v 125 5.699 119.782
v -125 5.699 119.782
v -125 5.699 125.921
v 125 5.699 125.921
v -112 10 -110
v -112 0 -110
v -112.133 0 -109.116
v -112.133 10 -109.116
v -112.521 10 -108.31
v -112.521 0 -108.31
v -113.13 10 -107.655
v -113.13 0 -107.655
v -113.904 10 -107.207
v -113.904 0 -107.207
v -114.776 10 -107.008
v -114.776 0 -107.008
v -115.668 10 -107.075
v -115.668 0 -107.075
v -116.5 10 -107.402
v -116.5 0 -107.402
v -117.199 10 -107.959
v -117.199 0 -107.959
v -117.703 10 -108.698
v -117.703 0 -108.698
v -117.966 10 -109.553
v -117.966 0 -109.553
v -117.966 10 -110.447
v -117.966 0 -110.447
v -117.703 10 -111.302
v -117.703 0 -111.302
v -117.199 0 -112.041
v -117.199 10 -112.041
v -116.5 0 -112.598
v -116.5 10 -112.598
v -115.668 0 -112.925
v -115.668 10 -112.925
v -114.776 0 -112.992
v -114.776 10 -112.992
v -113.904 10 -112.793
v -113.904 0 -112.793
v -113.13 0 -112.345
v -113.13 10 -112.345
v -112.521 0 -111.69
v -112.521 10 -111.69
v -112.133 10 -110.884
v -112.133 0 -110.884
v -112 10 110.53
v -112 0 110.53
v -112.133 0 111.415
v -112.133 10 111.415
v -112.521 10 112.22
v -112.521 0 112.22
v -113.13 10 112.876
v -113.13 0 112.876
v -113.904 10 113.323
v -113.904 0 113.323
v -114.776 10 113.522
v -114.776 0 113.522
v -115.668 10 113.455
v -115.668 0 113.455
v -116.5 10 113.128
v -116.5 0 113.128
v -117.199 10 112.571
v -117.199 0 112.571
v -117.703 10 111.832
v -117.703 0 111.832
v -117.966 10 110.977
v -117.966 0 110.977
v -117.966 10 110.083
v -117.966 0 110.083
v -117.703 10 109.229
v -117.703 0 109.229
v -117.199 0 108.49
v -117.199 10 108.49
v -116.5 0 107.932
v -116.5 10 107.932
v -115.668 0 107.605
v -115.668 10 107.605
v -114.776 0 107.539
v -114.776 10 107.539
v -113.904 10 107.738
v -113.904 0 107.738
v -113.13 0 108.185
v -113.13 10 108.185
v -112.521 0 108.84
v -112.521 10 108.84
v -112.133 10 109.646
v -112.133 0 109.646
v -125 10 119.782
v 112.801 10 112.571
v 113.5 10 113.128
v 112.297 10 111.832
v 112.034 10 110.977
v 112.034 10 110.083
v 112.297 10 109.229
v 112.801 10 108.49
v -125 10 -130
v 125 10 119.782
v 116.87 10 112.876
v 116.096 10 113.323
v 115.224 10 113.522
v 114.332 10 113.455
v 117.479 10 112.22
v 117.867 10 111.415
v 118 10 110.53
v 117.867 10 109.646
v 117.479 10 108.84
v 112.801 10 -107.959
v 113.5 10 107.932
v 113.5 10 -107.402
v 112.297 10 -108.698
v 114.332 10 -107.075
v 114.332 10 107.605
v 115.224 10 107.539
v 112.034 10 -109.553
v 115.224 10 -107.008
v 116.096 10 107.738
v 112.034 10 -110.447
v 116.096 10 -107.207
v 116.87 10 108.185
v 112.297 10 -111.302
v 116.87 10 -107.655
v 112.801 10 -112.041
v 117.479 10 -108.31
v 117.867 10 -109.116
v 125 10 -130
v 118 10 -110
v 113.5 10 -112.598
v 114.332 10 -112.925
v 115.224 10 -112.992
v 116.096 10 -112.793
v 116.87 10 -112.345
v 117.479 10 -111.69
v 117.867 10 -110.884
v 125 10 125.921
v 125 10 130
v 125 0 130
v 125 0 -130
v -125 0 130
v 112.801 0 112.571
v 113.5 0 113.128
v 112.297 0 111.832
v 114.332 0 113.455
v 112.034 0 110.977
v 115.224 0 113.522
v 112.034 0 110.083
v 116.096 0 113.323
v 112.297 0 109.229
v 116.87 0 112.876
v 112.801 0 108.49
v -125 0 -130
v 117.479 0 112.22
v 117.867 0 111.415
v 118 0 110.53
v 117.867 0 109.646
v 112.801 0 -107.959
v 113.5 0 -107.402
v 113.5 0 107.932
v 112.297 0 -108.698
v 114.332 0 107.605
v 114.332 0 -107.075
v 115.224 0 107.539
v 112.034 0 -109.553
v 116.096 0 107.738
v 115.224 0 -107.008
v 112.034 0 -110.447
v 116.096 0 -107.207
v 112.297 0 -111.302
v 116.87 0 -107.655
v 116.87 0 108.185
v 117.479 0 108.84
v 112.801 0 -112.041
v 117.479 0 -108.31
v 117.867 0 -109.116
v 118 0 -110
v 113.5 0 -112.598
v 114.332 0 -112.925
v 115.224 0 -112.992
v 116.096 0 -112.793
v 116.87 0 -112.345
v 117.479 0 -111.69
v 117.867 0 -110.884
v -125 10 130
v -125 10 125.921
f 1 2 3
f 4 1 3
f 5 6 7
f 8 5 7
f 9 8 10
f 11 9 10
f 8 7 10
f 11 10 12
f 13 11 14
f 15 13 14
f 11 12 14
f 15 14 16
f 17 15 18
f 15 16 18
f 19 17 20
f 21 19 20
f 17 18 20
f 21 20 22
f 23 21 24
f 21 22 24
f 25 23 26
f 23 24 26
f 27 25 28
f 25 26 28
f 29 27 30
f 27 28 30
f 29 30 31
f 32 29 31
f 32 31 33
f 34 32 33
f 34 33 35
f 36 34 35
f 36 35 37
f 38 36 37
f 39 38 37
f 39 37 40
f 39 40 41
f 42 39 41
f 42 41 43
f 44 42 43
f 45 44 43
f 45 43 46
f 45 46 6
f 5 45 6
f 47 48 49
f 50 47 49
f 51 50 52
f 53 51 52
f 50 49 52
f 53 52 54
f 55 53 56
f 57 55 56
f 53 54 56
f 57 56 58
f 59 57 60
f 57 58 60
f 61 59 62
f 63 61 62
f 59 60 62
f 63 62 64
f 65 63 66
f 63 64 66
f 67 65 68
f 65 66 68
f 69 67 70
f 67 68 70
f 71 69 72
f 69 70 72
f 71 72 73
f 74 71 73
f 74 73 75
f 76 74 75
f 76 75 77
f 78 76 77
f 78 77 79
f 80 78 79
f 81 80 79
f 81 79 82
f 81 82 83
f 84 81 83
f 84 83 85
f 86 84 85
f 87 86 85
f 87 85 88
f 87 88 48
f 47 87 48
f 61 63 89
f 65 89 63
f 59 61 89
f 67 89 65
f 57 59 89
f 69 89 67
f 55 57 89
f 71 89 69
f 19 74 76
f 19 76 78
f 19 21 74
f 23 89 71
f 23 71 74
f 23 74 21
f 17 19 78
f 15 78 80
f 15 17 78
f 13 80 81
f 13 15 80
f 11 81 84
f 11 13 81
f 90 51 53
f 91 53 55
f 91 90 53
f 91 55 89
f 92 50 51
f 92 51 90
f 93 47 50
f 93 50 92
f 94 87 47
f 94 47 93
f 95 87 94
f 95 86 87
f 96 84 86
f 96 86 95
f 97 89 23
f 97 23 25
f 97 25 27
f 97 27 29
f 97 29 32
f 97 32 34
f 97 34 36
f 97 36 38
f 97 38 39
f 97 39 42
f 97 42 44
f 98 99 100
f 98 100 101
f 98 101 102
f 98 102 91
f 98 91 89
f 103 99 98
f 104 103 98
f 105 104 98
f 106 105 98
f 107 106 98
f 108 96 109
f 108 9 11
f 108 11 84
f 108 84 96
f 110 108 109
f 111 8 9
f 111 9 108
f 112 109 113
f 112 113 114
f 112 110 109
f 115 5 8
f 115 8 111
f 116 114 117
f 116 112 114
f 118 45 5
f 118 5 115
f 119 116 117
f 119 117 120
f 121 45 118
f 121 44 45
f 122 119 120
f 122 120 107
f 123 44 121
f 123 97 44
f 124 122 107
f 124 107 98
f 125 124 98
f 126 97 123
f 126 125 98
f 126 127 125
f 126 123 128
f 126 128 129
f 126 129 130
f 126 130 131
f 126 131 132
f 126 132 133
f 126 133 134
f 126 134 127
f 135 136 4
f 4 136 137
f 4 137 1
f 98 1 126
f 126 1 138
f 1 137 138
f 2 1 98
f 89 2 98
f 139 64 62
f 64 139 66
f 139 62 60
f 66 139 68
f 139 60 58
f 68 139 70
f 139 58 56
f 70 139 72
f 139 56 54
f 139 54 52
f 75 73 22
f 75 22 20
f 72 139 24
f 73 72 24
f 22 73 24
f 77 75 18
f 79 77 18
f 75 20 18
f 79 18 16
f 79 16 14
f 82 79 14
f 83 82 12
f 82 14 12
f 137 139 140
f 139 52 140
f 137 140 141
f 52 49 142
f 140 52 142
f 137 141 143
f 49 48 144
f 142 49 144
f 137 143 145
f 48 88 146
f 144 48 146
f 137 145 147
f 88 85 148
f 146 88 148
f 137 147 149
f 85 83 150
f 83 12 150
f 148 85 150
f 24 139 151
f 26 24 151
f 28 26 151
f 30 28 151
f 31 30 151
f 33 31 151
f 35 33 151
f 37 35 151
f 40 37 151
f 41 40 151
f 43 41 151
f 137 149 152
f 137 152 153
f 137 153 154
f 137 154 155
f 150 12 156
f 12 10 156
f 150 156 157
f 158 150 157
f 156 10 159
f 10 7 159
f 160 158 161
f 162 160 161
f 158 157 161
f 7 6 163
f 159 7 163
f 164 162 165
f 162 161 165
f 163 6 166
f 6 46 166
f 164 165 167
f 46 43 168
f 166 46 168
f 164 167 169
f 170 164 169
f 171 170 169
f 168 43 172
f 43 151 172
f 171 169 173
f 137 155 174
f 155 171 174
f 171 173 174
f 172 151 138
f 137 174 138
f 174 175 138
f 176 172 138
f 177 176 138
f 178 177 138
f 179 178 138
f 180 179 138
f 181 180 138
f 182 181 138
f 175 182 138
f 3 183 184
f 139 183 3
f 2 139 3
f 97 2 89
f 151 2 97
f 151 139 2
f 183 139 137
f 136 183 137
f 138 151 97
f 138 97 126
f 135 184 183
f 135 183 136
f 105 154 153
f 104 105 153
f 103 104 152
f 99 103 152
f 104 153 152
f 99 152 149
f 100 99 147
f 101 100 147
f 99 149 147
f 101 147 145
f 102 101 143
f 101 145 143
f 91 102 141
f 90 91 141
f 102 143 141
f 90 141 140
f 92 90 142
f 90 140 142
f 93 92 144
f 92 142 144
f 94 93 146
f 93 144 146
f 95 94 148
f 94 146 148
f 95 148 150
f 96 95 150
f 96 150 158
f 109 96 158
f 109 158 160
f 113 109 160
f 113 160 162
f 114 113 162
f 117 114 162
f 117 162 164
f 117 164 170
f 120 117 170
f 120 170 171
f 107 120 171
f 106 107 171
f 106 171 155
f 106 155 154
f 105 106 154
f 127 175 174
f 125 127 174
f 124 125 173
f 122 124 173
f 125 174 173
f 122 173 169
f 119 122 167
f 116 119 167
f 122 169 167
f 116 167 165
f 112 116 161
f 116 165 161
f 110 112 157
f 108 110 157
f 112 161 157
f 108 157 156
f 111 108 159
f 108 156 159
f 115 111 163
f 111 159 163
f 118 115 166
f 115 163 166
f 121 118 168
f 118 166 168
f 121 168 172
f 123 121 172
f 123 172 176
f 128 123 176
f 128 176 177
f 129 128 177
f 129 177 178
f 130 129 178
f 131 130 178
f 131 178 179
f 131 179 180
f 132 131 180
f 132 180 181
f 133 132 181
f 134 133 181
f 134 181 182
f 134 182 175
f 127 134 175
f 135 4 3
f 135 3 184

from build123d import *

# Parameters (mm, degrees)
CROQUIS1_W              = 250
CROQUIS1_H              = 260
SALIENTE_EXTRUIR1_DEPTH = 10
CORTAR_EXTRUIR1_REACH   = 252
CROQUIS4_W              = 6.138345694
CROQUIS4_H              = 4.301035896
CORTAR_EXTRUIR2_REACH   = 12
CROQUIS5_R              = 3


with BuildPart() as part:
    # Croquis1 → Saliente-Extruir1 (new body)
    with BuildSketch(Plane(origin=(0, 0, 0), x_dir=(1, 0, 0), z_dir=(0, 1, 0))):
        Rectangle(CROQUIS1_W, CROQUIS1_H)
    extrude(amount=SALIENTE_EXTRUIR1_DEPTH)

    # Croquis4 → Cortar-Extruir1 (cut, up to next)
    with BuildSketch(Plane.ZY.offset(125), mode=Mode.PRIVATE) as cortar_extruir1_sk1:
        with Locations((122.851537289, 7.849482052)):
            Rectangle(CROQUIS4_W, CROQUIS4_H)
    cortar_extruir1_tool1 = extrude(cortar_extruir1_sk1.sketch, amount=-CORTAR_EXTRUIR1_REACH, mode=Mode.PRIVATE) & part.part
    add(cortar_extruir1_tool1.solids().sort_by_distance((-125, 7.849482, 122.851537))[0], mode=Mode.SUBTRACT)

    # Croquis5 → Cortar-Extruir2 (cut, up to next)
    with BuildSketch(Plane.XZ, mode=Mode.PRIVATE) as cortar_extruir2_sk1:
        with Locations((-115, 110.530243228)):
            Circle(CROQUIS5_R)
    cortar_extruir2_tool1 = extrude(cortar_extruir2_sk1.sketch, amount=-CORTAR_EXTRUIR2_REACH, mode=Mode.PRIVATE) & part.part
    add(cortar_extruir2_tool1.solids().sort_by_distance((-115, 0, 110.530243))[0], mode=Mode.SUBTRACT)
    # Croquis5 → Cortar-Extruir2 (cut, up to next)
    with BuildSketch(Plane.XZ, mode=Mode.PRIVATE) as cortar_extruir2_sk2:
        with Locations((115, 110.530243228)):
            Circle(CROQUIS5_R)
    cortar_extruir2_tool2 = extrude(cortar_extruir2_sk2.sketch, amount=-CORTAR_EXTRUIR2_REACH, mode=Mode.PRIVATE) & part.part
    add(cortar_extruir2_tool2.solids().sort_by_distance((115, 0, 110.530243))[0], mode=Mode.SUBTRACT)
    # Croquis5 → Cortar-Extruir2 (cut, up to next)
    with BuildSketch(Plane.XZ, mode=Mode.PRIVATE) as cortar_extruir2_sk3:
        with Locations((-115, -110)):
            Circle(CROQUIS5_R)
    cortar_extruir2_tool3 = extrude(cortar_extruir2_sk3.sketch, amount=-CORTAR_EXTRUIR2_REACH, mode=Mode.PRIVATE) & part.part
    add(cortar_extruir2_tool3.solids().sort_by_distance((-115, 0, -110))[0], mode=Mode.SUBTRACT)
    # Croquis5 → Cortar-Extruir2 (cut, up to next)
    with BuildSketch(Plane.XZ, mode=Mode.PRIVATE) as cortar_extruir2_sk4:
        with Locations((115, -110)):
            Circle(CROQUIS5_R)
    cortar_extruir2_tool4 = extrude(cortar_extruir2_sk4.sketch, amount=-CORTAR_EXTRUIR2_REACH, mode=Mode.PRIVATE) & part.part
    add(cortar_extruir2_tool4.solids().sort_by_distance((115, 0, -110))[0], mode=Mode.SUBTRACT)


solid = part.part
